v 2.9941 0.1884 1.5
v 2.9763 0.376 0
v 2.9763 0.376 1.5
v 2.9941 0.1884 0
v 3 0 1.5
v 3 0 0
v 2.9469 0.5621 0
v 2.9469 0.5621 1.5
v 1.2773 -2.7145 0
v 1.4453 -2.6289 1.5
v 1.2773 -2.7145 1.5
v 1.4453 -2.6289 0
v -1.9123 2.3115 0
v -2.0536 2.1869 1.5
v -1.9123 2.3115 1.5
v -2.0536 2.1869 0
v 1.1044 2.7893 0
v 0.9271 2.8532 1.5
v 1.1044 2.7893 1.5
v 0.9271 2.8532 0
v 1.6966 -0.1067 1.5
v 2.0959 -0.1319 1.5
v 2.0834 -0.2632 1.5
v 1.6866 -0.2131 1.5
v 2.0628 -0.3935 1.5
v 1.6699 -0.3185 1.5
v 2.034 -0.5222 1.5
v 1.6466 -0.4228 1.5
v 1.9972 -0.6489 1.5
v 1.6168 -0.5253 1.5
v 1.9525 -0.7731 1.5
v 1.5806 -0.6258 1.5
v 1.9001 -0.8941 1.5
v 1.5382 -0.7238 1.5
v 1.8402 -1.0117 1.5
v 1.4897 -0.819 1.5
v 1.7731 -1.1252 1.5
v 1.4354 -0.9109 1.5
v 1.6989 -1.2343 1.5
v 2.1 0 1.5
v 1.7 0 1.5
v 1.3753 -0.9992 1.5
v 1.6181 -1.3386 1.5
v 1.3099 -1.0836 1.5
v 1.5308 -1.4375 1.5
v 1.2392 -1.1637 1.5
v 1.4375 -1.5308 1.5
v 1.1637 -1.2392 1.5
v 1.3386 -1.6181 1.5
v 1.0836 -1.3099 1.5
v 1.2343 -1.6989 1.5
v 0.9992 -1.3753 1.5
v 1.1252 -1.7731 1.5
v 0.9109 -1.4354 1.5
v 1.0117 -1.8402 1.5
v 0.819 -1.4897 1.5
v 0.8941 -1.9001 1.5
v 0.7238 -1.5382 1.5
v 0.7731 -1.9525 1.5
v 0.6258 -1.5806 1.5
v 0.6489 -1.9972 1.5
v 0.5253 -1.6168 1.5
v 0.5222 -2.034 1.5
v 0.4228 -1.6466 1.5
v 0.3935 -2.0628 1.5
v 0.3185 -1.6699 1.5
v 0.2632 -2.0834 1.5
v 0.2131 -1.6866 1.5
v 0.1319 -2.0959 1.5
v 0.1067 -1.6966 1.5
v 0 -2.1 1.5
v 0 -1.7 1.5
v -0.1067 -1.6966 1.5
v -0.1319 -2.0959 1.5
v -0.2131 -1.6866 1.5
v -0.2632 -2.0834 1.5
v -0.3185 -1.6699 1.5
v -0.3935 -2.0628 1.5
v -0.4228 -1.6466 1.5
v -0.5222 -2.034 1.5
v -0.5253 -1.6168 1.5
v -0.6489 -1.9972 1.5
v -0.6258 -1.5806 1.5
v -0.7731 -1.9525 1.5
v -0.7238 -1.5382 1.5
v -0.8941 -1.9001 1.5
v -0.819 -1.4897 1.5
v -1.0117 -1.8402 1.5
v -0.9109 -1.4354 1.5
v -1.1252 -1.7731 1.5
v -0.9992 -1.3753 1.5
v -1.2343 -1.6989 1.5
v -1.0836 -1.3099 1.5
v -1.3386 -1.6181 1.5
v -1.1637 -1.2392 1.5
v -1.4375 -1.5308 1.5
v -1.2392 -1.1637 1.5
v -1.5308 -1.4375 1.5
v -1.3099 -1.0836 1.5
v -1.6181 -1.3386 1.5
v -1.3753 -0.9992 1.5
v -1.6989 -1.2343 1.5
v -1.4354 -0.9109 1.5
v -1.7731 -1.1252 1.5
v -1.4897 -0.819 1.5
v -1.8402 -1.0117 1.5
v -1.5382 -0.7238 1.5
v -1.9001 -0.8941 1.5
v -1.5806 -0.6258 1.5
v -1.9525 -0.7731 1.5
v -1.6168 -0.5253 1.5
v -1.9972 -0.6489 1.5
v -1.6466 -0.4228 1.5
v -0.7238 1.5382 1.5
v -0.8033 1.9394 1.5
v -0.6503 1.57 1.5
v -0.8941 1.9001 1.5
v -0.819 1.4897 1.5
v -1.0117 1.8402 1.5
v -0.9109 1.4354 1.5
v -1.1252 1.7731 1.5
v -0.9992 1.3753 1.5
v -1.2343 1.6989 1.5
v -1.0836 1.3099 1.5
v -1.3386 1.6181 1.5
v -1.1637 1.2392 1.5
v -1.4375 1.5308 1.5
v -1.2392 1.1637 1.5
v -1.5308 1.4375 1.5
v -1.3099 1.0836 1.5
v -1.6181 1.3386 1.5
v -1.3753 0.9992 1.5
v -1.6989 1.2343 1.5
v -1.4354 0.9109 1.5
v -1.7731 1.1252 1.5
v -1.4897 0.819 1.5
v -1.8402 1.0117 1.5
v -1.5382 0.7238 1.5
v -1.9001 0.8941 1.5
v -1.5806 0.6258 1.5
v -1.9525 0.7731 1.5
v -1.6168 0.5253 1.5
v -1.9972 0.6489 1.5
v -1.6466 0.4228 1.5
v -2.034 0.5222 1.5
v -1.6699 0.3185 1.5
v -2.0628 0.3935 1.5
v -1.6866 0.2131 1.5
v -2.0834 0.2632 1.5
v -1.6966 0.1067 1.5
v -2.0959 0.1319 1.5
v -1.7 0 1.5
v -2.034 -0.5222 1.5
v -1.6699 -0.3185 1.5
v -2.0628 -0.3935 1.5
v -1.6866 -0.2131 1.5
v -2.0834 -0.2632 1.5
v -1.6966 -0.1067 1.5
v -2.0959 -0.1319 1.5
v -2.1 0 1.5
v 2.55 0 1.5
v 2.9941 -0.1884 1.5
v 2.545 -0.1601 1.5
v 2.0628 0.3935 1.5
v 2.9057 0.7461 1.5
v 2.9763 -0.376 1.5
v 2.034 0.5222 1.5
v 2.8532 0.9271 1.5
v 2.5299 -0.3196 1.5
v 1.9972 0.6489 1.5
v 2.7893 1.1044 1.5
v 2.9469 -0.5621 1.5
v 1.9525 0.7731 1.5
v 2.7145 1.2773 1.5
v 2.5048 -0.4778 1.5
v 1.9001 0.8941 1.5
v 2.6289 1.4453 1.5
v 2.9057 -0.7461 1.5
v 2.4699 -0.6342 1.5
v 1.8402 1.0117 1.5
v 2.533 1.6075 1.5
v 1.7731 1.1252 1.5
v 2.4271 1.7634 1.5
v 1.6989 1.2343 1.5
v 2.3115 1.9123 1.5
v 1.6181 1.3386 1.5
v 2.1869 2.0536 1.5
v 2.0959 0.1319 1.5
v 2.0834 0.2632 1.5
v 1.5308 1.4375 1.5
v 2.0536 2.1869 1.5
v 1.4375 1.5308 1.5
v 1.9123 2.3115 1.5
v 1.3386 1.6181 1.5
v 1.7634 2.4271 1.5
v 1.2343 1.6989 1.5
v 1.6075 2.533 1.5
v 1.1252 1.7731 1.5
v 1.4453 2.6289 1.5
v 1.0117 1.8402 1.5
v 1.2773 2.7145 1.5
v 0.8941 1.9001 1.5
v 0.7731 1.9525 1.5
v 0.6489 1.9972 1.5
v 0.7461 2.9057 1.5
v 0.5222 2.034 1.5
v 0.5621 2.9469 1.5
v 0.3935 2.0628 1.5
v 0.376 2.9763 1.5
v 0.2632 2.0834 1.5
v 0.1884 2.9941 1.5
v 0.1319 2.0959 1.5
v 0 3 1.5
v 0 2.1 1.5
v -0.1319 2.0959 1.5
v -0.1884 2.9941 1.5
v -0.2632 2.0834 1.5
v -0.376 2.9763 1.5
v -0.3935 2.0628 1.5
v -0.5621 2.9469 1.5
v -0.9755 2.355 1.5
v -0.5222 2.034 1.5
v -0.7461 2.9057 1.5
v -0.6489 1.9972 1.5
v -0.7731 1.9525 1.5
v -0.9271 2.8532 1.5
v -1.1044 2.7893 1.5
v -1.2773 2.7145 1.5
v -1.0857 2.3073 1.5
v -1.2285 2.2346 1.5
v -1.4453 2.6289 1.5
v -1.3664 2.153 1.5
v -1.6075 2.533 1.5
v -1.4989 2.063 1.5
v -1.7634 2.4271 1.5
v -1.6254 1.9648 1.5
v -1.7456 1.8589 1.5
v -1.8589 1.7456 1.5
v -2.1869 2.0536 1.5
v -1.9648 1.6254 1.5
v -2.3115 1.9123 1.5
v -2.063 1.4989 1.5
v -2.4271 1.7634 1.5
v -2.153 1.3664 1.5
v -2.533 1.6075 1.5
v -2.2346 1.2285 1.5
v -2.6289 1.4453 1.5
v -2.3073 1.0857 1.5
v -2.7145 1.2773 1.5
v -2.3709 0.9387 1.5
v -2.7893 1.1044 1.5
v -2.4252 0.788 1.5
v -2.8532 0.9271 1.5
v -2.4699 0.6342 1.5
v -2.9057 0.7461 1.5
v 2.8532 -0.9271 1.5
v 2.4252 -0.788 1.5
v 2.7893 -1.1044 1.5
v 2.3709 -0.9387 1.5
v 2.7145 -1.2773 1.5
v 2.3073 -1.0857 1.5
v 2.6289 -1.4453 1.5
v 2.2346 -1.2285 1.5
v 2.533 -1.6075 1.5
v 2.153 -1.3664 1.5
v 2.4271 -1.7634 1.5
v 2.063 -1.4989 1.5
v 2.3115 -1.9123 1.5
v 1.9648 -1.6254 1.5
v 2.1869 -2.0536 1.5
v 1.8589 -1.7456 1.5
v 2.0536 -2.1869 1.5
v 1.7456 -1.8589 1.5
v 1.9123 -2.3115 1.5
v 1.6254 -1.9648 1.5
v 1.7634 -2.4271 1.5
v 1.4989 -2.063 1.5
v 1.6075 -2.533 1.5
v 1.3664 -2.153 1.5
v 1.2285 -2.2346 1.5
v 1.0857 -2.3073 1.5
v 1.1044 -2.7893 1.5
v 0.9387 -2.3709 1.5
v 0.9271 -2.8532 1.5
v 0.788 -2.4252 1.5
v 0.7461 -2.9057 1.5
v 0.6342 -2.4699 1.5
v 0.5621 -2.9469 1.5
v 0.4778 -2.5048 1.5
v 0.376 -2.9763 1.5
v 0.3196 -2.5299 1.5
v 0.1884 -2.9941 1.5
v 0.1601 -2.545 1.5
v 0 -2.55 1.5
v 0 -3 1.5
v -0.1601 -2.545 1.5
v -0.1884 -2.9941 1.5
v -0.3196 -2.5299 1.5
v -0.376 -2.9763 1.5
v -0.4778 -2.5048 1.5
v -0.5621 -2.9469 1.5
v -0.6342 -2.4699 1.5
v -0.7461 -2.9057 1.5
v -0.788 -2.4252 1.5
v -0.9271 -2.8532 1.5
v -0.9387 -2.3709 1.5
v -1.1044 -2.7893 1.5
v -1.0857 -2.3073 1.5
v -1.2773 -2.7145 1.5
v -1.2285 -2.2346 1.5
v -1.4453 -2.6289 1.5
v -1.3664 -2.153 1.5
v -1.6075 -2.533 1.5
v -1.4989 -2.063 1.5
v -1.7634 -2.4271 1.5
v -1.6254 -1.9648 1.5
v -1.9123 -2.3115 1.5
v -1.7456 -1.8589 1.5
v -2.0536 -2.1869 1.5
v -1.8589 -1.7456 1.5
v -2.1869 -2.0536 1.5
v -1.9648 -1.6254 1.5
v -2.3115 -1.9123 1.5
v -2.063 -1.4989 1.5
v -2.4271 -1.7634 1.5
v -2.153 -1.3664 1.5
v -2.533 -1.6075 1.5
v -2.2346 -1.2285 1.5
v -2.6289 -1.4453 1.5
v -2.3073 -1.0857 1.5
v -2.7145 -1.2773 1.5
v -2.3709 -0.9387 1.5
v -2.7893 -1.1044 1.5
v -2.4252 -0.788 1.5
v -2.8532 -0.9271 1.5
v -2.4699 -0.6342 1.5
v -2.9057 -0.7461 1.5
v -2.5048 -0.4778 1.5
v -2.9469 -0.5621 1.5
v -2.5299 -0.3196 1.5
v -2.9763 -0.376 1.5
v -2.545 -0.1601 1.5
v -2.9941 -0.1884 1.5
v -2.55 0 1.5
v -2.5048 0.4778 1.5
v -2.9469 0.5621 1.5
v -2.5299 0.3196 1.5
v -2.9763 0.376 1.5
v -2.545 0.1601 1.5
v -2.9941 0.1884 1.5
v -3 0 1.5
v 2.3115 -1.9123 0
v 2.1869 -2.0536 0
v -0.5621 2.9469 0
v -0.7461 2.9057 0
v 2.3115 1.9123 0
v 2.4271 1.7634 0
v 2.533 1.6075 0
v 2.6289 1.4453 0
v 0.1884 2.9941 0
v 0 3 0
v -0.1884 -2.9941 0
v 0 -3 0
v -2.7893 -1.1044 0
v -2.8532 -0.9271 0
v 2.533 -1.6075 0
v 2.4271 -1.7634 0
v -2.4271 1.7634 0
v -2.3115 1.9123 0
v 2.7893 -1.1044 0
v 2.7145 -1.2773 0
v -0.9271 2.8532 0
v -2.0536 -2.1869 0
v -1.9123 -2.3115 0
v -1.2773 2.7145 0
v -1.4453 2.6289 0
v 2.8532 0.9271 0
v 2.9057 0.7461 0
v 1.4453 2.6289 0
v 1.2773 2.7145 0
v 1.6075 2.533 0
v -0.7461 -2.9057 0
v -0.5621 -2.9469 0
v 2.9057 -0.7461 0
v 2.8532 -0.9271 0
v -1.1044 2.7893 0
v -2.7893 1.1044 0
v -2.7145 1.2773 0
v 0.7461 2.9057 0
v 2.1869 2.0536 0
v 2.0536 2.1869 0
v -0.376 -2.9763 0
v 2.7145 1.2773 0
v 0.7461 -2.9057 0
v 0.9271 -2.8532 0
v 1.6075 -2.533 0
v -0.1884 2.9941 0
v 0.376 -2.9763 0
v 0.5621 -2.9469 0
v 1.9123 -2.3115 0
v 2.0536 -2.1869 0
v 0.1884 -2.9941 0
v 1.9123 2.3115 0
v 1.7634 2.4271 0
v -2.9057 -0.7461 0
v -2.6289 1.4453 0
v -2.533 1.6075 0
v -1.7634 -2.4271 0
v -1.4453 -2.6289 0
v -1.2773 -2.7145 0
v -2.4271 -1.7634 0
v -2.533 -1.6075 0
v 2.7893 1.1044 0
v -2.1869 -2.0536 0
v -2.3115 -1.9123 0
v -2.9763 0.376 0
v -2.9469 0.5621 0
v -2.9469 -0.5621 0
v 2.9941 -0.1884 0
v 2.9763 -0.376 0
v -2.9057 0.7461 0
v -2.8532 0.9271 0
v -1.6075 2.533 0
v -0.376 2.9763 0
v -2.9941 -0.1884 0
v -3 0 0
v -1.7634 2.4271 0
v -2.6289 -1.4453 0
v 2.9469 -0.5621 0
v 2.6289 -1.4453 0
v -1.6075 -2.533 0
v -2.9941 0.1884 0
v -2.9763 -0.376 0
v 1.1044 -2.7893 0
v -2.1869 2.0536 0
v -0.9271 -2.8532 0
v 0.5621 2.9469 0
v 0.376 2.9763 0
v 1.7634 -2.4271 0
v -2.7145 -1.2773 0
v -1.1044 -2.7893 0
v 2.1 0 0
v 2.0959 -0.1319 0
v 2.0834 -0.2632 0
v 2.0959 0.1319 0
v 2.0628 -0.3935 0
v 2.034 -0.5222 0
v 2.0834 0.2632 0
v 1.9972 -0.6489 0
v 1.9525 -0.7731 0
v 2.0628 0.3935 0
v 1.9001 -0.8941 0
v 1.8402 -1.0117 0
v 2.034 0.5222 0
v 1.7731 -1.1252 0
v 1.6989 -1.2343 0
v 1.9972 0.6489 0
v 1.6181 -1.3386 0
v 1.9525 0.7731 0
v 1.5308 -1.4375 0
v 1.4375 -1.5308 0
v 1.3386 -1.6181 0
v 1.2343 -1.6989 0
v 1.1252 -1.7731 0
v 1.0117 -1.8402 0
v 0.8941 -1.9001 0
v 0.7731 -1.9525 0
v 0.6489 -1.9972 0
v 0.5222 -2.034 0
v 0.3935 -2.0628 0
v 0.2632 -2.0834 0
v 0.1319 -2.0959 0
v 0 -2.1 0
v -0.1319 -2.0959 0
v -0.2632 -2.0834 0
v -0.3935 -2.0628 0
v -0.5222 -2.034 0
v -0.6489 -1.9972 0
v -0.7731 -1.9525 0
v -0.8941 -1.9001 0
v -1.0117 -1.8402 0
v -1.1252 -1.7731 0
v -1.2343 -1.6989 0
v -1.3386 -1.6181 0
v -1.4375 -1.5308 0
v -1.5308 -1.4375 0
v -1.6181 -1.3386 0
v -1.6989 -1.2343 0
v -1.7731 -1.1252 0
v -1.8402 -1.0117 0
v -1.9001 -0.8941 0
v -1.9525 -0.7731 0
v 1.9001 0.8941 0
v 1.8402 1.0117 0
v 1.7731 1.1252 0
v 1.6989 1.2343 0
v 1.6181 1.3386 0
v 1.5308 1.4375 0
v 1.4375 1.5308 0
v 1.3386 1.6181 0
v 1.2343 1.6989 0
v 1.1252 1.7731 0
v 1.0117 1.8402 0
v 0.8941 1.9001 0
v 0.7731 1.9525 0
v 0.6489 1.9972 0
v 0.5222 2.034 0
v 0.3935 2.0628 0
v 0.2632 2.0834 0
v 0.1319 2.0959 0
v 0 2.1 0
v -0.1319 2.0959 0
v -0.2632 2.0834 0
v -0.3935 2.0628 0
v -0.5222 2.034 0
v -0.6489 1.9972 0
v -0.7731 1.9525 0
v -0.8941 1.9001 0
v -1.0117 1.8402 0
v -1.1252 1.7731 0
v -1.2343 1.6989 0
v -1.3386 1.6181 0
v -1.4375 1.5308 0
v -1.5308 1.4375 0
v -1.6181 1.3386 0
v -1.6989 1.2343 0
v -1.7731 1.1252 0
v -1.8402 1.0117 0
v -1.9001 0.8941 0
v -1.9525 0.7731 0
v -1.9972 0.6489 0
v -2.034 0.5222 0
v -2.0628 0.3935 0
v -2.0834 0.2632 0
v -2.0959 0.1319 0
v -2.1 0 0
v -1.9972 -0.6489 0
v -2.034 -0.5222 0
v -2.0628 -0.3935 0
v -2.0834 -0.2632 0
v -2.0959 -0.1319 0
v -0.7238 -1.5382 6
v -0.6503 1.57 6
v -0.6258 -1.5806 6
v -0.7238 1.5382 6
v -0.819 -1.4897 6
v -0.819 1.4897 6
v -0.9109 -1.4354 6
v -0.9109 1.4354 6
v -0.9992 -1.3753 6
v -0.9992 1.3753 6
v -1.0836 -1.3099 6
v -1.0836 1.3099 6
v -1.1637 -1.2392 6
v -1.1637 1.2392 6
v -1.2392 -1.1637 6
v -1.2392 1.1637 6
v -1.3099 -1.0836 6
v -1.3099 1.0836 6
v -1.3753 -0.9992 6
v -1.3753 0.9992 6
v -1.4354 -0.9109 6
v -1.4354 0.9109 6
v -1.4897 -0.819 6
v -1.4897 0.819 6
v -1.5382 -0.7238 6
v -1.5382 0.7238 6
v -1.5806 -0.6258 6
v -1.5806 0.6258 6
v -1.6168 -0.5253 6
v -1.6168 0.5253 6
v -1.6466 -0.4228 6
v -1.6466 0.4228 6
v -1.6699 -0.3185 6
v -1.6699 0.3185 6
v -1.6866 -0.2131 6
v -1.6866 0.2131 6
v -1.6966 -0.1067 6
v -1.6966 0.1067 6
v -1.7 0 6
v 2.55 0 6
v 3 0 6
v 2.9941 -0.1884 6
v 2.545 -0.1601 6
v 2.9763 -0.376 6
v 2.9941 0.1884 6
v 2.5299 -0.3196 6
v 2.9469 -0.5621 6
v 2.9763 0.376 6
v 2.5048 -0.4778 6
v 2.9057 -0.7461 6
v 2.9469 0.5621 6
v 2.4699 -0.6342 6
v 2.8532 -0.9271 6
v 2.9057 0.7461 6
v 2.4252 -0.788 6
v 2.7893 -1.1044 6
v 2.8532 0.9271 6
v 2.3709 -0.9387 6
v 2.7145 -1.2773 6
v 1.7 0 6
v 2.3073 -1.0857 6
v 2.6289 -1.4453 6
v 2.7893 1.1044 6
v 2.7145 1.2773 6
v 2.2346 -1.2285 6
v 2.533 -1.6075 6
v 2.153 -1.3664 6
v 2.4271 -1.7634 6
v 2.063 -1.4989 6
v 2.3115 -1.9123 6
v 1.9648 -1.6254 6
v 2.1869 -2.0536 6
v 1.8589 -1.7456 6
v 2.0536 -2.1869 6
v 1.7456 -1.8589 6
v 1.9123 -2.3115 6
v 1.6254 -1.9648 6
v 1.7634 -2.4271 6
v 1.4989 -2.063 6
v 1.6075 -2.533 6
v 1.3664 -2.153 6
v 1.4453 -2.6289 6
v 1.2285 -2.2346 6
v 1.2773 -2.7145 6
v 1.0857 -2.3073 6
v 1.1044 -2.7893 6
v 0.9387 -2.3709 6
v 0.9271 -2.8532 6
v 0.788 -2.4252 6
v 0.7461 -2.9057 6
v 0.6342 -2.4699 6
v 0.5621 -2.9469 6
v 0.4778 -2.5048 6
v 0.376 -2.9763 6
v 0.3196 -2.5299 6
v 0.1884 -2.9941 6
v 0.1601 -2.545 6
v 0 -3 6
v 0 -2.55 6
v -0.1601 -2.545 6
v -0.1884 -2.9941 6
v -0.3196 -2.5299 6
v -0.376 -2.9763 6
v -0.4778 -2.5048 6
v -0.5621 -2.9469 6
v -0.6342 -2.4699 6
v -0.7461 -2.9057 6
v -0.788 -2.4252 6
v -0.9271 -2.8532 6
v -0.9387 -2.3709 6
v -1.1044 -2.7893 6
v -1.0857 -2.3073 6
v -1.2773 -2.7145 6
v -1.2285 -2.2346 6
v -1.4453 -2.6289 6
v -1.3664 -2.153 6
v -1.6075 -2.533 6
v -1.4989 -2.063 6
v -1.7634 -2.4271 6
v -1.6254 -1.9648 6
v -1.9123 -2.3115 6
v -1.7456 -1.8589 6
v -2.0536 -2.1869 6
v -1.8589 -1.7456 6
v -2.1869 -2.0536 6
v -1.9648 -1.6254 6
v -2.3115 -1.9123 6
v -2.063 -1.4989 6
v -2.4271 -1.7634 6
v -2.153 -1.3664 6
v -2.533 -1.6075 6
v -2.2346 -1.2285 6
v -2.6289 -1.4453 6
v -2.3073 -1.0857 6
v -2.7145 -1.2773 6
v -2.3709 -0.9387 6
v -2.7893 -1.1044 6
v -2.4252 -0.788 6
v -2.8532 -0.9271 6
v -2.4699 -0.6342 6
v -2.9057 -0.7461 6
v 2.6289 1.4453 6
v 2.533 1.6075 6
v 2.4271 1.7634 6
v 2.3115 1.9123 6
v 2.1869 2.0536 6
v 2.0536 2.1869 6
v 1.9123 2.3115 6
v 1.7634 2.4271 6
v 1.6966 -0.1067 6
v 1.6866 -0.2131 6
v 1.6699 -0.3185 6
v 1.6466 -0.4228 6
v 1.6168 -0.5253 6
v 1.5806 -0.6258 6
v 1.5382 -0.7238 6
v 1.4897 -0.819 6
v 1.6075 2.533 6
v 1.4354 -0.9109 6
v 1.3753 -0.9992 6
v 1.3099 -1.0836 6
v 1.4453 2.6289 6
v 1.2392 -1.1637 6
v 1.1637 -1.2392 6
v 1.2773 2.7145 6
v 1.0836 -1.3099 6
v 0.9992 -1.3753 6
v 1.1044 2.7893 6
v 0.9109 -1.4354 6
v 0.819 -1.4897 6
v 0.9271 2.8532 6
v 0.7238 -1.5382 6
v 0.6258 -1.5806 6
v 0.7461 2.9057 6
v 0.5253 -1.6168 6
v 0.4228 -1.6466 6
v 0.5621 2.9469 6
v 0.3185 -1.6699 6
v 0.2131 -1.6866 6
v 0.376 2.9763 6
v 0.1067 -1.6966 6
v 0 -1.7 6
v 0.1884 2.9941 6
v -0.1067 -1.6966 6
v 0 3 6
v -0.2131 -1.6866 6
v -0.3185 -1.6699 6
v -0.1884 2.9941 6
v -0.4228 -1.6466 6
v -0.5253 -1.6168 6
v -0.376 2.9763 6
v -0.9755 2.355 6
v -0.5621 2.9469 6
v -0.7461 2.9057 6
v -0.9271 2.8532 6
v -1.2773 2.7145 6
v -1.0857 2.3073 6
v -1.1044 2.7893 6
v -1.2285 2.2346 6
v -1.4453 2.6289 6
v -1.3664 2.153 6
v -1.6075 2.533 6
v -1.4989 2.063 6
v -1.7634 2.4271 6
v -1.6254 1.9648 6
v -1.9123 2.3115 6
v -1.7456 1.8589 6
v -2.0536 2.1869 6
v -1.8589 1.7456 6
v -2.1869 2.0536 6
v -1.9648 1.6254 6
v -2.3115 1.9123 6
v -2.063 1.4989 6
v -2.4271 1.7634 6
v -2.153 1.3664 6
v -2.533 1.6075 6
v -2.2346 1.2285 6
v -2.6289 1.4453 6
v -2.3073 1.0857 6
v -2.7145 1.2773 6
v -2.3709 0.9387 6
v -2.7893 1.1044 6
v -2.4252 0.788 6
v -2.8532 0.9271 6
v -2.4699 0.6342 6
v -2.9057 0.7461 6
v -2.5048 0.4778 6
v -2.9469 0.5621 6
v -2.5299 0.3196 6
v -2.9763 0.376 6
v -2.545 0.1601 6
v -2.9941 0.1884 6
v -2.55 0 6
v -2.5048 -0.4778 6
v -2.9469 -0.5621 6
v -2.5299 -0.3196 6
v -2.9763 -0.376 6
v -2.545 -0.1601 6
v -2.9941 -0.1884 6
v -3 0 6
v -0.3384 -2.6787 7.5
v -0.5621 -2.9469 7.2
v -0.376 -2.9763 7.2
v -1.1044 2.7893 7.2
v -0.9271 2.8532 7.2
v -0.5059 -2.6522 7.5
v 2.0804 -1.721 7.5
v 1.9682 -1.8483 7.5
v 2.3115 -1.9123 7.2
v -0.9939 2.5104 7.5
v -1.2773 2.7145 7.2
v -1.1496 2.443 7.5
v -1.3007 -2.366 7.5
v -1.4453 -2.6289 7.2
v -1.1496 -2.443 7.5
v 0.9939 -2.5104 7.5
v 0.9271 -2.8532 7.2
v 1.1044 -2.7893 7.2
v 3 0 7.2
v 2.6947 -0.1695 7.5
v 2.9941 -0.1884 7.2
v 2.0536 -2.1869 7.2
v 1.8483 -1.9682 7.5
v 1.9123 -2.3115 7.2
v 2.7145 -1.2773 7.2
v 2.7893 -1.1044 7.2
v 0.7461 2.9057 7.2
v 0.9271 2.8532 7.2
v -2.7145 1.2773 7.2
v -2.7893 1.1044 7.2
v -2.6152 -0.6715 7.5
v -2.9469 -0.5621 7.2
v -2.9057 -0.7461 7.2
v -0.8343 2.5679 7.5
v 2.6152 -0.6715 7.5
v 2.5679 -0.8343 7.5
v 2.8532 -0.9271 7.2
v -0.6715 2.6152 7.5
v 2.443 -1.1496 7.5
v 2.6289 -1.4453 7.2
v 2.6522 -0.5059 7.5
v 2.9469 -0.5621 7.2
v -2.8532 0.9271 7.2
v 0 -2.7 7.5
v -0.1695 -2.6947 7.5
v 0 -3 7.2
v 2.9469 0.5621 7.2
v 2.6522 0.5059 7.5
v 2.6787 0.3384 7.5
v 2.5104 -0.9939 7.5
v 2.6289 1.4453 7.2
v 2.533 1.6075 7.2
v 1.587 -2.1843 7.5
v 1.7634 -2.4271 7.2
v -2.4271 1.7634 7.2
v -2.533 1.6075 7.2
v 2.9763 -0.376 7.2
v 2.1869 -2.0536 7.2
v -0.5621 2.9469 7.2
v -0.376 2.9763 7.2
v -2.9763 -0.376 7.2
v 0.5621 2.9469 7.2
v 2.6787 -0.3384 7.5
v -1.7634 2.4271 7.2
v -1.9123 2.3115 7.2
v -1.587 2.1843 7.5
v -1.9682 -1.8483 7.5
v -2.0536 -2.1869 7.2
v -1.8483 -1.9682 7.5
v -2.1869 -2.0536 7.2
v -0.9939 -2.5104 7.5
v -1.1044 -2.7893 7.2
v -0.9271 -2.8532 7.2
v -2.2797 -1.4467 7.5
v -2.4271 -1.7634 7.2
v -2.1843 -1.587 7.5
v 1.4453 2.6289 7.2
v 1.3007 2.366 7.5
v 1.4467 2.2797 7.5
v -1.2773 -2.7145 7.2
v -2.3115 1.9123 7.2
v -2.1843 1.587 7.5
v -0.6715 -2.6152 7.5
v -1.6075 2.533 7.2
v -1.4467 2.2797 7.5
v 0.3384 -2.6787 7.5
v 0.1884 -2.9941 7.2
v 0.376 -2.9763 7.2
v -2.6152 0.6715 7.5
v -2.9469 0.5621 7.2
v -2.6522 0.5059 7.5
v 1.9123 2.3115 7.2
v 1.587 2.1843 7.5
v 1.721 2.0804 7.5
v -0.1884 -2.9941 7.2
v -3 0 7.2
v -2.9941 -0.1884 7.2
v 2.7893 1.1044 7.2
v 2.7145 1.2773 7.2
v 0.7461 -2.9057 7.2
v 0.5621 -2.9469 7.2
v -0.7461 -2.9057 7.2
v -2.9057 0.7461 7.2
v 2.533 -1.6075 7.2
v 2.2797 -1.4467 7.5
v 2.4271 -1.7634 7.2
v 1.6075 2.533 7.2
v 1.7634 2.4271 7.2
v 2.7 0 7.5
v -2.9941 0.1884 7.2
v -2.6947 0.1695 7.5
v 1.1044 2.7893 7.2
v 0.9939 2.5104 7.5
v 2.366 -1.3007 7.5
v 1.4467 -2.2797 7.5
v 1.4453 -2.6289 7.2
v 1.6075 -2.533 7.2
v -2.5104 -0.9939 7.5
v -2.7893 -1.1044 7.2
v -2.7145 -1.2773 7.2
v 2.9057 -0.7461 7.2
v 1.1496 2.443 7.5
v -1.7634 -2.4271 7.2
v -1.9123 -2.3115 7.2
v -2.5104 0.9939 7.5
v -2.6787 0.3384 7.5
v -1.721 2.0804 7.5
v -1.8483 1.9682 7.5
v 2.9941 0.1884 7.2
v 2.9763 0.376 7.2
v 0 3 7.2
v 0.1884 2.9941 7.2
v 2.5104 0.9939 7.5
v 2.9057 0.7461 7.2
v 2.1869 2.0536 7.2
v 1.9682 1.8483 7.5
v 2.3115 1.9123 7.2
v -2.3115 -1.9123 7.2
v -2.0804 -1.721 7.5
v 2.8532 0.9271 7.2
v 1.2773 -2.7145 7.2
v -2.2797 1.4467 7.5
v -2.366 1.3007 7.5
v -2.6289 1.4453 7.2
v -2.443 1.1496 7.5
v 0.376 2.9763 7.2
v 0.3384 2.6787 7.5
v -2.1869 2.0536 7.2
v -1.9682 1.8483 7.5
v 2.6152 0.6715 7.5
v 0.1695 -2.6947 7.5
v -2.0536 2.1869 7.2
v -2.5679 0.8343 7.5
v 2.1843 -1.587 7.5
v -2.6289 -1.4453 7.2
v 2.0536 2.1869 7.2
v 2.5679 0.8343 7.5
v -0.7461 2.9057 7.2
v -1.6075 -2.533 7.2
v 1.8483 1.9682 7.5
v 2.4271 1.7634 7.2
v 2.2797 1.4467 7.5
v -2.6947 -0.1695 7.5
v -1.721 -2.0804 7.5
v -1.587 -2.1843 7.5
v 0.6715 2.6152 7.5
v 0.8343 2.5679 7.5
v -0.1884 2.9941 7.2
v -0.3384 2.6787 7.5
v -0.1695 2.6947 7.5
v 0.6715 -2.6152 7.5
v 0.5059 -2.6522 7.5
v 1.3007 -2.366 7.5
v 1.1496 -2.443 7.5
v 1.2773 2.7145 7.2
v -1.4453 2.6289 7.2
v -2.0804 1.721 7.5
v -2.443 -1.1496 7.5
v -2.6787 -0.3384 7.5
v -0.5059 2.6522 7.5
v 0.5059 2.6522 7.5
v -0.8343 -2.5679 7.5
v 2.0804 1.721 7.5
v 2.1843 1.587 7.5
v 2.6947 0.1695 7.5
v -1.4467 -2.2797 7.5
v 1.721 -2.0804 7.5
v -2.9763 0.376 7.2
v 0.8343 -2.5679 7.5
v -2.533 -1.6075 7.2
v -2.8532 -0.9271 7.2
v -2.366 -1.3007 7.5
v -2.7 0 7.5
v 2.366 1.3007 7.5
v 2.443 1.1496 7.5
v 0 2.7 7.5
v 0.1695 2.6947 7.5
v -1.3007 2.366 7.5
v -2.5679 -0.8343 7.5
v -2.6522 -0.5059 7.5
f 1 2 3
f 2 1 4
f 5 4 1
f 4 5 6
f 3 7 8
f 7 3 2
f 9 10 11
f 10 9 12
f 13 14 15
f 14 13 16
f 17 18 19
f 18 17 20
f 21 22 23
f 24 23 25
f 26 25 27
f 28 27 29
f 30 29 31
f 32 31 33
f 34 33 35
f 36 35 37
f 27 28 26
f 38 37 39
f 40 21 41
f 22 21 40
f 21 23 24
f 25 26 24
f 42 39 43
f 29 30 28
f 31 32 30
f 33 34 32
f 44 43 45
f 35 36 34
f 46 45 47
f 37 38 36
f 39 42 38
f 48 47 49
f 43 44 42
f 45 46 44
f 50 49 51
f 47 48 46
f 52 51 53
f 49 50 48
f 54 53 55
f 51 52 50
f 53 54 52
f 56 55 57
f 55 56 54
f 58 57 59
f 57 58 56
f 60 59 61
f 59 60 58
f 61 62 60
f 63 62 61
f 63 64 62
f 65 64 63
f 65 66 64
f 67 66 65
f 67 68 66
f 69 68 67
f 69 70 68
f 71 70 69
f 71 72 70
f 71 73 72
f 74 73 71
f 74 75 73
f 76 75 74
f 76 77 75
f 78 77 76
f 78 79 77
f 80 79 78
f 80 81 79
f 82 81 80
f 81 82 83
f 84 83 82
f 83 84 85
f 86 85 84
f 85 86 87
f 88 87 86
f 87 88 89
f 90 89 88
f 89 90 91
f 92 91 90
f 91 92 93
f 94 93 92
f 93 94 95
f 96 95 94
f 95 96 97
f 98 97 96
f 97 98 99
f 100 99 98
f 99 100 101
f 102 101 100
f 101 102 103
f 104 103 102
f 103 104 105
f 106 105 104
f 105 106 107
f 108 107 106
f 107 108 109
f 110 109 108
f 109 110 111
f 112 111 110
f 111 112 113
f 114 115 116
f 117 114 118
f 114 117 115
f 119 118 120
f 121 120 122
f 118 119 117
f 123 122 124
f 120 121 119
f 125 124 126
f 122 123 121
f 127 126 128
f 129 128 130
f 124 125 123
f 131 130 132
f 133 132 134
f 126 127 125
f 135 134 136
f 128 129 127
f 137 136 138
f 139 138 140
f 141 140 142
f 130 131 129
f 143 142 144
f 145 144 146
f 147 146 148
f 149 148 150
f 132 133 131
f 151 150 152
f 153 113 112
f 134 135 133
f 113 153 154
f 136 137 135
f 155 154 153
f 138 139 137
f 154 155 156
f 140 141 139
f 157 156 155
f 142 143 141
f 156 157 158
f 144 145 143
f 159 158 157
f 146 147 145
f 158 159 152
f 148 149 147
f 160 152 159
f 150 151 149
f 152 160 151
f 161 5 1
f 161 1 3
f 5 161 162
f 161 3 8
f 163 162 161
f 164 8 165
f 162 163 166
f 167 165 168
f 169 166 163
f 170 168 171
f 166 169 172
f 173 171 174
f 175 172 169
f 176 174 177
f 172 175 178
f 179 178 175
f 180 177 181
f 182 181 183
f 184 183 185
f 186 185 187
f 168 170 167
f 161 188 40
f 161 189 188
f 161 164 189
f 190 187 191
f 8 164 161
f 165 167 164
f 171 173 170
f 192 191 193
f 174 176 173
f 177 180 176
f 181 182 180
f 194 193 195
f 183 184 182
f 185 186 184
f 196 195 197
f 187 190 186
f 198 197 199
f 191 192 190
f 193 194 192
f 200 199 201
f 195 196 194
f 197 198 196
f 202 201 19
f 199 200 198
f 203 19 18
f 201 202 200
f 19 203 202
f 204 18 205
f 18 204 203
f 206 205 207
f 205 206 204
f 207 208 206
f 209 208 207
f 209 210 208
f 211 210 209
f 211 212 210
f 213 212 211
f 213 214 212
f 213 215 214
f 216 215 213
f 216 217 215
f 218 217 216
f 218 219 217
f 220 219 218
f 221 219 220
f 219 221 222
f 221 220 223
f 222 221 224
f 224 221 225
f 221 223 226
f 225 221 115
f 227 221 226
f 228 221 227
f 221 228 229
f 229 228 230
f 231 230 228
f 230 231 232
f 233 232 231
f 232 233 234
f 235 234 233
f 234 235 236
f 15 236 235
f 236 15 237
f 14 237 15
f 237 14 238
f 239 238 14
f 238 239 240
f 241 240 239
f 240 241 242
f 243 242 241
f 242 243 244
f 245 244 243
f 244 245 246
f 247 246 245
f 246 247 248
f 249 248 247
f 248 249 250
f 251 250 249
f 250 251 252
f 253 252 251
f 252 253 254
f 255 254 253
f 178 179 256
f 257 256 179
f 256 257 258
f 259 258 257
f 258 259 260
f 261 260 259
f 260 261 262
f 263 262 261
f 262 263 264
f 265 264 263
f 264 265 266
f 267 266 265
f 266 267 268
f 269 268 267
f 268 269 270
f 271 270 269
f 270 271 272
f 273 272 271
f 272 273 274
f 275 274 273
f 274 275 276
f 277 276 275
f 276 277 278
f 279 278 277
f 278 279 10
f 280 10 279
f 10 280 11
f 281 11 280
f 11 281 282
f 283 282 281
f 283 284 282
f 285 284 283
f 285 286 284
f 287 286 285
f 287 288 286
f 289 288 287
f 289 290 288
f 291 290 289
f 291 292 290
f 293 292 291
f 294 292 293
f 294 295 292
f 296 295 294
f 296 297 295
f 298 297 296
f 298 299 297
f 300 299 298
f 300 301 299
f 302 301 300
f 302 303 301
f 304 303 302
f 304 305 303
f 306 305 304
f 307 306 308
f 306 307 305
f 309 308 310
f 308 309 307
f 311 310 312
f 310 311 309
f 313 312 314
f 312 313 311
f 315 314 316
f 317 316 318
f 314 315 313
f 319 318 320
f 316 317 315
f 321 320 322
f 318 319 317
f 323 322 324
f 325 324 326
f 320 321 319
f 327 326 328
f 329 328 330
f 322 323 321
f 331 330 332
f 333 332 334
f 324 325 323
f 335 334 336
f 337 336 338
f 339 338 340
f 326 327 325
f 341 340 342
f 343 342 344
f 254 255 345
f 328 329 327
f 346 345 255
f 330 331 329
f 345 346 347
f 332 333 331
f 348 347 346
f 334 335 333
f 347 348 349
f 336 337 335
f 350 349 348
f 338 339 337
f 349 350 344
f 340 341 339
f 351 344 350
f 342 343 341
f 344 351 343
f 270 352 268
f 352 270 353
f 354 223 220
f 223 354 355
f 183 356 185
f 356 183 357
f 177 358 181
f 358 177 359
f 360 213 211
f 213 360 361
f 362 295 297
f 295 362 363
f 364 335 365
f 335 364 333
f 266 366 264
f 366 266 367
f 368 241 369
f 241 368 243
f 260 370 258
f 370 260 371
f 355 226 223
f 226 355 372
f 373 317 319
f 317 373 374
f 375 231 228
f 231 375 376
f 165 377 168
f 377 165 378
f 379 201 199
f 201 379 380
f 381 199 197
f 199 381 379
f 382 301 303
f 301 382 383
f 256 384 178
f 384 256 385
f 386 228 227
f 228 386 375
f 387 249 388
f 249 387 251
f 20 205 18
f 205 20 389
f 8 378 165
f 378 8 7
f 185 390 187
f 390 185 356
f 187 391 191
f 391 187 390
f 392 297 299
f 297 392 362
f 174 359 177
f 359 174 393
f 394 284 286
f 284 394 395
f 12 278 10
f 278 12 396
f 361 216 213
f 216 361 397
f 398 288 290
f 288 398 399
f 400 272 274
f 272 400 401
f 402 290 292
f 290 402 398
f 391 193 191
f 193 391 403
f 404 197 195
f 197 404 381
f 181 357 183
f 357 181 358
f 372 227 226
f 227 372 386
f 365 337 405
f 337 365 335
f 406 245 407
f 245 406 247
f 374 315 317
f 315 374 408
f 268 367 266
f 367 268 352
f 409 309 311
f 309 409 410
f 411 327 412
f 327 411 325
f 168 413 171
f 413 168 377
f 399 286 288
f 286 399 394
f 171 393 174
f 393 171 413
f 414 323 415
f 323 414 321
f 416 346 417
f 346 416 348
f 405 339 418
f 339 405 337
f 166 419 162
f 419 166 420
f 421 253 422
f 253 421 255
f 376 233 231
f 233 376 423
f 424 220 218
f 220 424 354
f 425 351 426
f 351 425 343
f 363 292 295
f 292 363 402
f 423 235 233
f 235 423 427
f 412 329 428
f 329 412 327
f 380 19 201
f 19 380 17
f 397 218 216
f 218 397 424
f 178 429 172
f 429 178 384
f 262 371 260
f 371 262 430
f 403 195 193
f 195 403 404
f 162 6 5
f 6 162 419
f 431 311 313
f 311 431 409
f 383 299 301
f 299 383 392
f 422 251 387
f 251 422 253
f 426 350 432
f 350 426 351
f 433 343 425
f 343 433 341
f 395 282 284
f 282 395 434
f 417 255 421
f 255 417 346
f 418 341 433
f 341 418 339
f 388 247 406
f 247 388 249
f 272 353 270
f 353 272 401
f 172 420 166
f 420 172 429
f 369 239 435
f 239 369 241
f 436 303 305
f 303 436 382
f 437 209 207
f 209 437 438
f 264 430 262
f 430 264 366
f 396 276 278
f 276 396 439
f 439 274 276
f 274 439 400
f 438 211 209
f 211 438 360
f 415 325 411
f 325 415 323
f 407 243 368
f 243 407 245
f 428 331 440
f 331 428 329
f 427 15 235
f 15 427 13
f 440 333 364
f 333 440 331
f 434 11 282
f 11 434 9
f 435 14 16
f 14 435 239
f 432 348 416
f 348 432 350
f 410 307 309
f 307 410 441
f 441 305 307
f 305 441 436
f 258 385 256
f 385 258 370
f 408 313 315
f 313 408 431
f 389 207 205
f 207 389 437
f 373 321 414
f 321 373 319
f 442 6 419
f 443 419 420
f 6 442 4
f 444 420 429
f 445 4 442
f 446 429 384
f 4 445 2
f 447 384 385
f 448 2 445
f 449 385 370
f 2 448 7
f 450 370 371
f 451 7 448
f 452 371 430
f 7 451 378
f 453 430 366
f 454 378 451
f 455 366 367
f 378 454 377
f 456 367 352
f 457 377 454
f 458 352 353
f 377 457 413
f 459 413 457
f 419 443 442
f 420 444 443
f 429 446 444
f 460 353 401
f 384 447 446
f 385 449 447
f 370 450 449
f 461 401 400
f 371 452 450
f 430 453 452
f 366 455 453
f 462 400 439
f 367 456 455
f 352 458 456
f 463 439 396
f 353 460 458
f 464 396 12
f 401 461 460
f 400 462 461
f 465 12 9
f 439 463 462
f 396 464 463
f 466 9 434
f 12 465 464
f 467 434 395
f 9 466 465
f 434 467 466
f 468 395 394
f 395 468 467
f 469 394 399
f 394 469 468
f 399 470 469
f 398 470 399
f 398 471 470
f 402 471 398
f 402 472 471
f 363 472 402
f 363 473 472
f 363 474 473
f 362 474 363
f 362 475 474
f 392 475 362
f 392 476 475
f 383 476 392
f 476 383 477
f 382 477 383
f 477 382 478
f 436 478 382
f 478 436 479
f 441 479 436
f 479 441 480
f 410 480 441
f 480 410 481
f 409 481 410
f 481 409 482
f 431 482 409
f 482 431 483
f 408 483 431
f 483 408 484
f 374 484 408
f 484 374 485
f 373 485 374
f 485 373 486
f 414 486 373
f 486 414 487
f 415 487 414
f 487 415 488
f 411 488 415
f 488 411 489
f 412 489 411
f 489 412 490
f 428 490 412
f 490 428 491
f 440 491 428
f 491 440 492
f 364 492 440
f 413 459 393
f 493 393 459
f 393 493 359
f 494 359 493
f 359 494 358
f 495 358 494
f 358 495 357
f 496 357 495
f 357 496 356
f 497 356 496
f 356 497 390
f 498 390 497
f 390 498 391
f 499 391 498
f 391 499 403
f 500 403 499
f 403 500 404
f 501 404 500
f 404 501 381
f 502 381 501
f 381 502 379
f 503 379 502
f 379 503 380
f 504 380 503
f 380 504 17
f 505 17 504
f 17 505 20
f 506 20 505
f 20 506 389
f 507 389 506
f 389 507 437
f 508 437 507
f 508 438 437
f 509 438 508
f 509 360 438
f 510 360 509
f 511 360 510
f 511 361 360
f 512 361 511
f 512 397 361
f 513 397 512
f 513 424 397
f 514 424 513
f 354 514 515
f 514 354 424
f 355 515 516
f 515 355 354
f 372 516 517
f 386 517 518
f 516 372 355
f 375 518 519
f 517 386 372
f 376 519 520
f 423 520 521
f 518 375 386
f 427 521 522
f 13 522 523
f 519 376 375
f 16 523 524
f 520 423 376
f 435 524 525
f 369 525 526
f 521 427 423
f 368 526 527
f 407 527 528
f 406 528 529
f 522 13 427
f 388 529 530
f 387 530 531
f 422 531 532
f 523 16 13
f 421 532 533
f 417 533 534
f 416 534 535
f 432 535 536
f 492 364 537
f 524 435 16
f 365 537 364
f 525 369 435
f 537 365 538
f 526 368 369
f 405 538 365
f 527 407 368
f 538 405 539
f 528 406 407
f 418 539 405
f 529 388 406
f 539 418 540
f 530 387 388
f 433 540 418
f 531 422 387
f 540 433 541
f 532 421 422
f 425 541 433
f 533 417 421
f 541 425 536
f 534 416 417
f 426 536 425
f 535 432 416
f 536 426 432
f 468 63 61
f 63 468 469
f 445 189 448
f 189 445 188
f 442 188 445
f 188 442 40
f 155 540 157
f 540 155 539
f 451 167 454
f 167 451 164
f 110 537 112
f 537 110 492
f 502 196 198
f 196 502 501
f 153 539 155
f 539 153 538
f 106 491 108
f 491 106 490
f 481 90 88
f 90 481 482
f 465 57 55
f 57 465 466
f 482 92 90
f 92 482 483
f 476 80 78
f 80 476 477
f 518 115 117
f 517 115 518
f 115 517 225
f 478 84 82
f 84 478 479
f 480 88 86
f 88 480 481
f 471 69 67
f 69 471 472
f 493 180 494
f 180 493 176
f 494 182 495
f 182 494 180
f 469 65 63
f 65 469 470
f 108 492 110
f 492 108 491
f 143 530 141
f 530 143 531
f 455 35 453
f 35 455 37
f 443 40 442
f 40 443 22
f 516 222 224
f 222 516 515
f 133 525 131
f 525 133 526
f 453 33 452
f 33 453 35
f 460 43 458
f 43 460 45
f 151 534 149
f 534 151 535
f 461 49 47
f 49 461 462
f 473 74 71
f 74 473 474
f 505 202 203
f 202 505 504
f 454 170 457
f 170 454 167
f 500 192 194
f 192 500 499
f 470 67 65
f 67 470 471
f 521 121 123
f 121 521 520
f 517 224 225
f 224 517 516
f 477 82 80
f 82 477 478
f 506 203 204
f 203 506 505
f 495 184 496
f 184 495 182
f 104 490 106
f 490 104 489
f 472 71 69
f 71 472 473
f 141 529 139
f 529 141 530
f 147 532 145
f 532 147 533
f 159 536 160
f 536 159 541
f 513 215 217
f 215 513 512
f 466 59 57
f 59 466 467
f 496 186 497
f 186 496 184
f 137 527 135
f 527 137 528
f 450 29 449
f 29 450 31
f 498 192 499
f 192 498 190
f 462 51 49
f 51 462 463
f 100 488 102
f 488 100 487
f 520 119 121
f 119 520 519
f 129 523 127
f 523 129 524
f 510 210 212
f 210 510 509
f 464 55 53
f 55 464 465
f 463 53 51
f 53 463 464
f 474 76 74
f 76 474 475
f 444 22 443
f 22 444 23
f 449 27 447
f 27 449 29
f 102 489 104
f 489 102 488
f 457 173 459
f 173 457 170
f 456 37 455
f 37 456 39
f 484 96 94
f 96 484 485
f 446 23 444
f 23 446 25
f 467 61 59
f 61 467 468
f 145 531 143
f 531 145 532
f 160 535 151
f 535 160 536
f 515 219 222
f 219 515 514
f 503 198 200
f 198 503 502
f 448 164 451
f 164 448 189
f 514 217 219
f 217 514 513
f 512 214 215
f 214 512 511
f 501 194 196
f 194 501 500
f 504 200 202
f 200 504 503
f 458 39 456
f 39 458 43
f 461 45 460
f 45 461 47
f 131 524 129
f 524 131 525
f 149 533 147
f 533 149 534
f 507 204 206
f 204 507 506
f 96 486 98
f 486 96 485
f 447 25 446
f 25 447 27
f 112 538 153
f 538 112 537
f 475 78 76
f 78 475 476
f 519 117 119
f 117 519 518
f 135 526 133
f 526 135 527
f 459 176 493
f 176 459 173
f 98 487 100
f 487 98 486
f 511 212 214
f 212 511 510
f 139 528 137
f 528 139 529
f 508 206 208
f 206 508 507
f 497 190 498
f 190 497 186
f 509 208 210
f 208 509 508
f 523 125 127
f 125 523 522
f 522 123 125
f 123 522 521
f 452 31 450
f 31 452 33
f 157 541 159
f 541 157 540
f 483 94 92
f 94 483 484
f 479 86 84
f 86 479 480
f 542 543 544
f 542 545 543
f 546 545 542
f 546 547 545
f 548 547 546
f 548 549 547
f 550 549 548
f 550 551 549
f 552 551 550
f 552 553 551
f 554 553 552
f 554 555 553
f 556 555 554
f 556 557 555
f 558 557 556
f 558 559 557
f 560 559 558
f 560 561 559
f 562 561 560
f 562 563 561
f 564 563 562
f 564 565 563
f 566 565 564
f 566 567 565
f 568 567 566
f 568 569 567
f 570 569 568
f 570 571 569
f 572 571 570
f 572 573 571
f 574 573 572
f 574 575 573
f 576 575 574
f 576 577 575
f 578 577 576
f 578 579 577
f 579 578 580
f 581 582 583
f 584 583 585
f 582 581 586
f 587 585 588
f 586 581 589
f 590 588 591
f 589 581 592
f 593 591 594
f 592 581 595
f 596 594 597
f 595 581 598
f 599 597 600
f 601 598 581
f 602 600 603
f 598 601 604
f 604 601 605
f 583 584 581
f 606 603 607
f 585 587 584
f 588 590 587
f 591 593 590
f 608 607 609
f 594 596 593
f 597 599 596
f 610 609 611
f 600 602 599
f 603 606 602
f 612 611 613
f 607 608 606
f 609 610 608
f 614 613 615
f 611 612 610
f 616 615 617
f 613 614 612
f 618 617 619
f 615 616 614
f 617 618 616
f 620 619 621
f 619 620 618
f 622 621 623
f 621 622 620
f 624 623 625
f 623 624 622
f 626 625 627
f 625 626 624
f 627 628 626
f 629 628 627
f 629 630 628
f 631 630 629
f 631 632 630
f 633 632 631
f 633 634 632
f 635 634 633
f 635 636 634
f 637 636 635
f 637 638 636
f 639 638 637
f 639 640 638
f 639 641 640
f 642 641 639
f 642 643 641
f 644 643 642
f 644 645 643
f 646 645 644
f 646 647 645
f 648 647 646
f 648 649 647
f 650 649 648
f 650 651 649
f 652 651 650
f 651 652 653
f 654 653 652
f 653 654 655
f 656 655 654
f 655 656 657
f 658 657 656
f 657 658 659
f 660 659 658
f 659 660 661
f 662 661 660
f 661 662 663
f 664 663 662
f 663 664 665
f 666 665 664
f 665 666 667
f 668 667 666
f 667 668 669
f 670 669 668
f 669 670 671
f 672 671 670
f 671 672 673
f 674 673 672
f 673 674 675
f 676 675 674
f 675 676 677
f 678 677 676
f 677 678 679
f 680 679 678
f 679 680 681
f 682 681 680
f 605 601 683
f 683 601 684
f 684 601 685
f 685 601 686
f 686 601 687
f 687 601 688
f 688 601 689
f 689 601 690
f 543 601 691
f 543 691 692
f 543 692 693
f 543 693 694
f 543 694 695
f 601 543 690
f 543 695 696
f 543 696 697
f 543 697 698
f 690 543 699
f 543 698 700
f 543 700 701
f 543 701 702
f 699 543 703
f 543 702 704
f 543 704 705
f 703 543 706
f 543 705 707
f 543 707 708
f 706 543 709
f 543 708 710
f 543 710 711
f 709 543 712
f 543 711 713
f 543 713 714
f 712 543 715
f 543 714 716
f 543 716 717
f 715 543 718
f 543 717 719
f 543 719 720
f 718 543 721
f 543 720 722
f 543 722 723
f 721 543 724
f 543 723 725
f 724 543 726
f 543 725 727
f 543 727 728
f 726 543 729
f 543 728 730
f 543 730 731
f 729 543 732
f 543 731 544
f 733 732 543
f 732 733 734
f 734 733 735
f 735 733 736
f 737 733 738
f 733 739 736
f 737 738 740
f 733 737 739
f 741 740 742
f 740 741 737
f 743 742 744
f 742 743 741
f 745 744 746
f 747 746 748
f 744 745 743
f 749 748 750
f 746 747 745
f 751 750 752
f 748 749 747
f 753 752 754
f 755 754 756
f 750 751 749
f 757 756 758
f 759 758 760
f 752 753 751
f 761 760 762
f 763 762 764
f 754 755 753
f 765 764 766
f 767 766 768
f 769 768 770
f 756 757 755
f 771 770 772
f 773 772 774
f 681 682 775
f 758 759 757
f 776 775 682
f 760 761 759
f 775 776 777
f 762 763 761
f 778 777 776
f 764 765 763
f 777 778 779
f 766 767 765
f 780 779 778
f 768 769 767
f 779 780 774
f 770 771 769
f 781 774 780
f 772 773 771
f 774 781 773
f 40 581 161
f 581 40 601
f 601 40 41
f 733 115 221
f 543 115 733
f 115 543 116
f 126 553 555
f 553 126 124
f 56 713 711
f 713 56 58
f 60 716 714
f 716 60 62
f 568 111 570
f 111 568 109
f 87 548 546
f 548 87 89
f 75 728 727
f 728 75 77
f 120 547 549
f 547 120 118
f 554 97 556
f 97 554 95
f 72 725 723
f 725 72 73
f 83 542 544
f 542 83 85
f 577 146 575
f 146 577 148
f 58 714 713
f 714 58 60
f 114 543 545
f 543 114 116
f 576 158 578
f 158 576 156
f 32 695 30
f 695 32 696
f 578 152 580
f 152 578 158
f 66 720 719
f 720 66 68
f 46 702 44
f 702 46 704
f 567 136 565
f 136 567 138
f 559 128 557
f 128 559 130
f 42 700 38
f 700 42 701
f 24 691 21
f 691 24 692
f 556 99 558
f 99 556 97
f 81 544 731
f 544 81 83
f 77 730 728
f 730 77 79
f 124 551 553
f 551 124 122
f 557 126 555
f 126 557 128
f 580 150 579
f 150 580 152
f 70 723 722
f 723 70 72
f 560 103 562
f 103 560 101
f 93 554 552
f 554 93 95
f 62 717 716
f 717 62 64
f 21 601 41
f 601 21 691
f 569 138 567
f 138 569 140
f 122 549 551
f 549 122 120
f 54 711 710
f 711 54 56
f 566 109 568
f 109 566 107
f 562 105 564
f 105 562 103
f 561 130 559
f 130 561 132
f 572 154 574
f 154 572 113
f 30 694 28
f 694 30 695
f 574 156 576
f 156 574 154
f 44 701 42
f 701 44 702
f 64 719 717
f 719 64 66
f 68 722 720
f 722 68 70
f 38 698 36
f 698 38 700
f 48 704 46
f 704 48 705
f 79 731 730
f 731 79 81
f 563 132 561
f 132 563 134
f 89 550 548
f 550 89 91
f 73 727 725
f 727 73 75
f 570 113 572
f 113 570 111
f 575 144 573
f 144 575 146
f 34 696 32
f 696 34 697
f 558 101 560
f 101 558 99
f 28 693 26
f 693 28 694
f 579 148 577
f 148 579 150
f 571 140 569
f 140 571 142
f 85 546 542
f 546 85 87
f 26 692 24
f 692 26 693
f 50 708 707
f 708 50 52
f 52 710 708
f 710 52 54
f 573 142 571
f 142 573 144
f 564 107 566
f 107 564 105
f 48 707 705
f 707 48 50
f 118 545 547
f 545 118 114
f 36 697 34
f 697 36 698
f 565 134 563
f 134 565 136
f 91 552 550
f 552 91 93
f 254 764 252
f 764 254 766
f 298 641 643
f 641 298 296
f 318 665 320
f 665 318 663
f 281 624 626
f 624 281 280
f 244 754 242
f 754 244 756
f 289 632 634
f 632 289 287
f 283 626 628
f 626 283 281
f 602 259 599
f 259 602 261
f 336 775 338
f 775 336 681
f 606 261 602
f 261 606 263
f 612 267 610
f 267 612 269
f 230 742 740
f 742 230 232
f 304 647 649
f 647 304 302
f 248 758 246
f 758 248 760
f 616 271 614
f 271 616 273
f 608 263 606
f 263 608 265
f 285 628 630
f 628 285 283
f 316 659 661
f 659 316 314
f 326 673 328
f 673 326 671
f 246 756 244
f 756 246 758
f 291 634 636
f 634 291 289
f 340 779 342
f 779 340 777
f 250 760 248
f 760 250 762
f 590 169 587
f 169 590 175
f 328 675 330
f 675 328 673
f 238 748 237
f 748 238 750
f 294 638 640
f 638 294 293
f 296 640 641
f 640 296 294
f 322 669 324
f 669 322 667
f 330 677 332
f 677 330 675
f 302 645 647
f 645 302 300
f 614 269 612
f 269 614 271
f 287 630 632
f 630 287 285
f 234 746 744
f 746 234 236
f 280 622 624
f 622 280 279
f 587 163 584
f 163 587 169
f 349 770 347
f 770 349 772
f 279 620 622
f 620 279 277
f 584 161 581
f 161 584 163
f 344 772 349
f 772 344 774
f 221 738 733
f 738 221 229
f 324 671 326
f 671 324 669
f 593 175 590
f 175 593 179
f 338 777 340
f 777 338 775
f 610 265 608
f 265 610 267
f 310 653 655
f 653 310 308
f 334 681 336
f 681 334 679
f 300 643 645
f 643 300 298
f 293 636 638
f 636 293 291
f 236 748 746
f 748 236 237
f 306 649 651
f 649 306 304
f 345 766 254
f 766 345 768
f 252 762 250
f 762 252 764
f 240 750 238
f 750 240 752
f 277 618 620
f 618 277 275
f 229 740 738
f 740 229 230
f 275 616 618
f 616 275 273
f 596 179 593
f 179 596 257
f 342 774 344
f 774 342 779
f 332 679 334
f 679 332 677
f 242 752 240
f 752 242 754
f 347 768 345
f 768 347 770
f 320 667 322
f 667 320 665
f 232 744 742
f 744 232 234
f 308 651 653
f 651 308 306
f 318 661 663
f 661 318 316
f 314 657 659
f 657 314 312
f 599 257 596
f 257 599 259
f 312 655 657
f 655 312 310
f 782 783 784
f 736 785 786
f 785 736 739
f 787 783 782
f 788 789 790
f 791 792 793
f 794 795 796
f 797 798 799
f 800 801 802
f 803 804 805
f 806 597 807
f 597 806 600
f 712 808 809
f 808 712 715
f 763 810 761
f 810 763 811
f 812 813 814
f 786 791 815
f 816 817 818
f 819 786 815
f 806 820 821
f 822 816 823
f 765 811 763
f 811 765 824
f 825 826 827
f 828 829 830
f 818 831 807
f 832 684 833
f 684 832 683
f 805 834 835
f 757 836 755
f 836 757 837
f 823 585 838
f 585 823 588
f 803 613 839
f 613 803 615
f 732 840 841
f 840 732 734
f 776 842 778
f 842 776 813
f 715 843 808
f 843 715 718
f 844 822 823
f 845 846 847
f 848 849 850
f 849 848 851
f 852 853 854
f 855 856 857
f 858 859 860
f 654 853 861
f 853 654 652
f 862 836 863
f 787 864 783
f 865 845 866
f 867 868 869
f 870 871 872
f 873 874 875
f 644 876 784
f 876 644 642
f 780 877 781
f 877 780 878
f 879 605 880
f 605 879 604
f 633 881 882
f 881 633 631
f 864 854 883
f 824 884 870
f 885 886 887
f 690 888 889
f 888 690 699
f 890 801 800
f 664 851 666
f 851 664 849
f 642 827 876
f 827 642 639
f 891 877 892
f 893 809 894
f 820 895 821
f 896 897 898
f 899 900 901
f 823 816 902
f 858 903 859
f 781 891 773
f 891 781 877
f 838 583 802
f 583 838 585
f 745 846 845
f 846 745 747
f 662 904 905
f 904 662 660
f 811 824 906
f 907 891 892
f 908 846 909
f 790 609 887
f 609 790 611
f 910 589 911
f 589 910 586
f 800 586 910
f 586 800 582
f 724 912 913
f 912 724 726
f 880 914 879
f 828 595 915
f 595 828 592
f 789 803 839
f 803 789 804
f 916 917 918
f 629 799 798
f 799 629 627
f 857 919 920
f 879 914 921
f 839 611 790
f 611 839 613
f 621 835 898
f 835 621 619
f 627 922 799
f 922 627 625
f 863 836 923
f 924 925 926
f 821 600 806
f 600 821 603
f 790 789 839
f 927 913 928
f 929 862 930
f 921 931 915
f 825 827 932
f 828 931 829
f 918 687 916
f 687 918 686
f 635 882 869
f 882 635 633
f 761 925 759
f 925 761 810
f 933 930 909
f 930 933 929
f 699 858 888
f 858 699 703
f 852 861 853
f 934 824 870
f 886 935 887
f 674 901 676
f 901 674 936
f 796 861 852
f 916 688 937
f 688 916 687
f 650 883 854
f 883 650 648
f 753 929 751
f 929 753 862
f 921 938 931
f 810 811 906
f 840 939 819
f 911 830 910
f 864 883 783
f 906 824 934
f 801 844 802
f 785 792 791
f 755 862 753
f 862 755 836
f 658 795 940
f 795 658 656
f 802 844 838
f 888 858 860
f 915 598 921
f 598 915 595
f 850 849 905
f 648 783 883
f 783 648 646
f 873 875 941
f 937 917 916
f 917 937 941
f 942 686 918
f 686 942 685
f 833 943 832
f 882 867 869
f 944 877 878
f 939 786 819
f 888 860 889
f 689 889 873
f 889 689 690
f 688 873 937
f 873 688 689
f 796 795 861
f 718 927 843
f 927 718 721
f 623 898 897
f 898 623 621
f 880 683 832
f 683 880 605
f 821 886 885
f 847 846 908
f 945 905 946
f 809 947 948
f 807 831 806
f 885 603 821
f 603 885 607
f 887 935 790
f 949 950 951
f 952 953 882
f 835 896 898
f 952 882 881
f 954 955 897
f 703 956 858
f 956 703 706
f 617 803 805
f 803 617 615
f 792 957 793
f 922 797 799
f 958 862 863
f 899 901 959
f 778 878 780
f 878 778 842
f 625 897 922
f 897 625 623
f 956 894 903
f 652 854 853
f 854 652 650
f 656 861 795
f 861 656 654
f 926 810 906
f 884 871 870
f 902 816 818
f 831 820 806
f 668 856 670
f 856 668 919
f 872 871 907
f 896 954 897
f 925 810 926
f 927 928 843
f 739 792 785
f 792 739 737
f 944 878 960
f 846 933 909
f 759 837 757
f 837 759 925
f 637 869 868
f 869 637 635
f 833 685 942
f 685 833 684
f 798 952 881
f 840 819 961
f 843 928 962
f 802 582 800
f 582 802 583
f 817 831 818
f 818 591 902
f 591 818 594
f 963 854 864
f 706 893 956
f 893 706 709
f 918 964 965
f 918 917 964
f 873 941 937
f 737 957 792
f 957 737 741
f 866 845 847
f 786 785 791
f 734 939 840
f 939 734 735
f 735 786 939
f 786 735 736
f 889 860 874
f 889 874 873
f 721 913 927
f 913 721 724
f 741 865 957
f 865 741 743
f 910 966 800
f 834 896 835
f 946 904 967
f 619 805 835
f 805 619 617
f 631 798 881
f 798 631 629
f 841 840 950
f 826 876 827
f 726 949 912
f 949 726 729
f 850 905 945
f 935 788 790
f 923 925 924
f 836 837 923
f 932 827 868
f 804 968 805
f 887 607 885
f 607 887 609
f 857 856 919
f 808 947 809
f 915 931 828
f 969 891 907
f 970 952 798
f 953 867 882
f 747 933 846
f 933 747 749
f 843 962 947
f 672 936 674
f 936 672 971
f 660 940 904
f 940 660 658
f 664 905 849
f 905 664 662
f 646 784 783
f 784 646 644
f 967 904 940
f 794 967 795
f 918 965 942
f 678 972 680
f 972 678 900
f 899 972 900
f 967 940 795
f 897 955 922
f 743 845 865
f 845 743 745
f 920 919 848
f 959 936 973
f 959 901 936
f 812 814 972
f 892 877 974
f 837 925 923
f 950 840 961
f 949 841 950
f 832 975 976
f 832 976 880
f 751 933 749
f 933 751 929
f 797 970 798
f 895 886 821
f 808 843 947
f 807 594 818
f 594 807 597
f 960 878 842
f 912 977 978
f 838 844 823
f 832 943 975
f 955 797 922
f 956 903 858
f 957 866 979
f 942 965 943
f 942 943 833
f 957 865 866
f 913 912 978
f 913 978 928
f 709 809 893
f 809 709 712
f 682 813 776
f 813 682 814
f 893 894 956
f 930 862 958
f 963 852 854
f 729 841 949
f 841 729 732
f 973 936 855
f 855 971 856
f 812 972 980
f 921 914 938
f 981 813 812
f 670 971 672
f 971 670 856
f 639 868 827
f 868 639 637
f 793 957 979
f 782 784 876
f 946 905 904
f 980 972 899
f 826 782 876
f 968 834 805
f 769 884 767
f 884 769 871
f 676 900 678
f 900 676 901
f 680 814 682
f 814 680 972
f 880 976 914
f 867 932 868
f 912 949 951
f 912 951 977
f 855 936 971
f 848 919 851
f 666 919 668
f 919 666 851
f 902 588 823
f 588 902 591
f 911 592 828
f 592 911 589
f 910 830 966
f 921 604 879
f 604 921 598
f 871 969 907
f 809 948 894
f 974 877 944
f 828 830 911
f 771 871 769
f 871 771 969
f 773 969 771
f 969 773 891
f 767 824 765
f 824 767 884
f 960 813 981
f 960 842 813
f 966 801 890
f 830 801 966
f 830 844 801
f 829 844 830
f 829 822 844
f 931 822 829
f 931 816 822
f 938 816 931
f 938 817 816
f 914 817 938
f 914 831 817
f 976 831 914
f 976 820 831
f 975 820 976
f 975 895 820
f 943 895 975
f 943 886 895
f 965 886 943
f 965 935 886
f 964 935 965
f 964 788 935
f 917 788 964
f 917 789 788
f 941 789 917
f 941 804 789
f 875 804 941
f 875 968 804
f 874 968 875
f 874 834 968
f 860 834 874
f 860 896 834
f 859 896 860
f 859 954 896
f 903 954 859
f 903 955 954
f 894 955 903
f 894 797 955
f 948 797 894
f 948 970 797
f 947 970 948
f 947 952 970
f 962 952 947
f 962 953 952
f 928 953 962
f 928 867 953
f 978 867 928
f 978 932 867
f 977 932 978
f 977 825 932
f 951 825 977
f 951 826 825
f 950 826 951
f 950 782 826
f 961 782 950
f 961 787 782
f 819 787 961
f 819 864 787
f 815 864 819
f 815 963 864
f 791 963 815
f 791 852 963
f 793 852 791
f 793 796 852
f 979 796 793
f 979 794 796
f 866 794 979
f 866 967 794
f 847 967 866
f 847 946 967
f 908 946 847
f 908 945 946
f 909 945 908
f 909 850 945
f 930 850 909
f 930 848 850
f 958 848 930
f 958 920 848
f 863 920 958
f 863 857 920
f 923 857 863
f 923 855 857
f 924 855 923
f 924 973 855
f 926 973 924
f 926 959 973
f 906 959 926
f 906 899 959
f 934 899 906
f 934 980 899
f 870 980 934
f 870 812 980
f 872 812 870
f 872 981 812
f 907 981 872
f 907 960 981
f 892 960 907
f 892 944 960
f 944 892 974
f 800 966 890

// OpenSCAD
module laterne(led=3, winkel=112.5)
{
    deckeldicke=1.5;
    mittenhoehe=1.5*led;
    mittenradius=led*0.85;
    bevel=0.3;
    
    //Boden
    difference()
    {
        cylinder(h=deckeldicke,r1=led,r2=led,$fn=100);
        translate([0,0,-0.1]) cylinder(h=deckeldicke+0.2,r1=led/2+0.6,r2=led/2+0.6,$fn=100);
    }
    //Mitte
    difference()
    {
        translate([0,0,deckeldicke]) cylinder(h=mittenhoehe,r1=mittenradius,r2=mittenradius,$fn=100);
        union()
        {
            translate([0,0,deckeldicke-0.1]) cylinder(h=mittenhoehe+0.1,r1=led/2+0.2,r2=led/2+0.2,$fn=100);
            translate([0,0,deckeldicke]) sector(mittenhoehe,led*2,0,winkel);
        }
    }
    //Deckel
    hull()
    {
        translate([0,0,mittenhoehe+deckeldicke]) cylinder(h=deckeldicke-bevel,r1=led,r2=led,$fn=100);
        translate([0,0,mittenhoehe+2*deckeldicke-bevel]) cylinder(h=bevel,r1=led-bevel,r2=led-bevel,$fn=100);
    }
}

//cylinder sector https://gist.github.com/plumbum/78e3c8281e1c031601456df2aa8e37c6
module sector(h, d, a1, a2) 
{
    if (a2 - a1 > 180) 
    {
        difference() 
        {
            cylinder(h=h, d=d);
            translate([0,0,-0.5]) sector(h+1, d+1, a2-360, a1); 
        }
    } 
    else 
    {
        difference() 
        {
            cylinder(h=h, d=d);
            rotate([0,0,a1]) translate([-d/2, -d/2, -0.5]) cube([d, d/2, h+1]);
            rotate([0,0,a2]) translate([-d/2, 0, -0.5]) cube([d, d/2, h+1]);
        }
    }
}

//Positionslaterne 112.5°
//Hecklicht 135°
//Topplicht 225°
//LED-Größen 3mm oder 5mm
laterne(3, 112.5);
